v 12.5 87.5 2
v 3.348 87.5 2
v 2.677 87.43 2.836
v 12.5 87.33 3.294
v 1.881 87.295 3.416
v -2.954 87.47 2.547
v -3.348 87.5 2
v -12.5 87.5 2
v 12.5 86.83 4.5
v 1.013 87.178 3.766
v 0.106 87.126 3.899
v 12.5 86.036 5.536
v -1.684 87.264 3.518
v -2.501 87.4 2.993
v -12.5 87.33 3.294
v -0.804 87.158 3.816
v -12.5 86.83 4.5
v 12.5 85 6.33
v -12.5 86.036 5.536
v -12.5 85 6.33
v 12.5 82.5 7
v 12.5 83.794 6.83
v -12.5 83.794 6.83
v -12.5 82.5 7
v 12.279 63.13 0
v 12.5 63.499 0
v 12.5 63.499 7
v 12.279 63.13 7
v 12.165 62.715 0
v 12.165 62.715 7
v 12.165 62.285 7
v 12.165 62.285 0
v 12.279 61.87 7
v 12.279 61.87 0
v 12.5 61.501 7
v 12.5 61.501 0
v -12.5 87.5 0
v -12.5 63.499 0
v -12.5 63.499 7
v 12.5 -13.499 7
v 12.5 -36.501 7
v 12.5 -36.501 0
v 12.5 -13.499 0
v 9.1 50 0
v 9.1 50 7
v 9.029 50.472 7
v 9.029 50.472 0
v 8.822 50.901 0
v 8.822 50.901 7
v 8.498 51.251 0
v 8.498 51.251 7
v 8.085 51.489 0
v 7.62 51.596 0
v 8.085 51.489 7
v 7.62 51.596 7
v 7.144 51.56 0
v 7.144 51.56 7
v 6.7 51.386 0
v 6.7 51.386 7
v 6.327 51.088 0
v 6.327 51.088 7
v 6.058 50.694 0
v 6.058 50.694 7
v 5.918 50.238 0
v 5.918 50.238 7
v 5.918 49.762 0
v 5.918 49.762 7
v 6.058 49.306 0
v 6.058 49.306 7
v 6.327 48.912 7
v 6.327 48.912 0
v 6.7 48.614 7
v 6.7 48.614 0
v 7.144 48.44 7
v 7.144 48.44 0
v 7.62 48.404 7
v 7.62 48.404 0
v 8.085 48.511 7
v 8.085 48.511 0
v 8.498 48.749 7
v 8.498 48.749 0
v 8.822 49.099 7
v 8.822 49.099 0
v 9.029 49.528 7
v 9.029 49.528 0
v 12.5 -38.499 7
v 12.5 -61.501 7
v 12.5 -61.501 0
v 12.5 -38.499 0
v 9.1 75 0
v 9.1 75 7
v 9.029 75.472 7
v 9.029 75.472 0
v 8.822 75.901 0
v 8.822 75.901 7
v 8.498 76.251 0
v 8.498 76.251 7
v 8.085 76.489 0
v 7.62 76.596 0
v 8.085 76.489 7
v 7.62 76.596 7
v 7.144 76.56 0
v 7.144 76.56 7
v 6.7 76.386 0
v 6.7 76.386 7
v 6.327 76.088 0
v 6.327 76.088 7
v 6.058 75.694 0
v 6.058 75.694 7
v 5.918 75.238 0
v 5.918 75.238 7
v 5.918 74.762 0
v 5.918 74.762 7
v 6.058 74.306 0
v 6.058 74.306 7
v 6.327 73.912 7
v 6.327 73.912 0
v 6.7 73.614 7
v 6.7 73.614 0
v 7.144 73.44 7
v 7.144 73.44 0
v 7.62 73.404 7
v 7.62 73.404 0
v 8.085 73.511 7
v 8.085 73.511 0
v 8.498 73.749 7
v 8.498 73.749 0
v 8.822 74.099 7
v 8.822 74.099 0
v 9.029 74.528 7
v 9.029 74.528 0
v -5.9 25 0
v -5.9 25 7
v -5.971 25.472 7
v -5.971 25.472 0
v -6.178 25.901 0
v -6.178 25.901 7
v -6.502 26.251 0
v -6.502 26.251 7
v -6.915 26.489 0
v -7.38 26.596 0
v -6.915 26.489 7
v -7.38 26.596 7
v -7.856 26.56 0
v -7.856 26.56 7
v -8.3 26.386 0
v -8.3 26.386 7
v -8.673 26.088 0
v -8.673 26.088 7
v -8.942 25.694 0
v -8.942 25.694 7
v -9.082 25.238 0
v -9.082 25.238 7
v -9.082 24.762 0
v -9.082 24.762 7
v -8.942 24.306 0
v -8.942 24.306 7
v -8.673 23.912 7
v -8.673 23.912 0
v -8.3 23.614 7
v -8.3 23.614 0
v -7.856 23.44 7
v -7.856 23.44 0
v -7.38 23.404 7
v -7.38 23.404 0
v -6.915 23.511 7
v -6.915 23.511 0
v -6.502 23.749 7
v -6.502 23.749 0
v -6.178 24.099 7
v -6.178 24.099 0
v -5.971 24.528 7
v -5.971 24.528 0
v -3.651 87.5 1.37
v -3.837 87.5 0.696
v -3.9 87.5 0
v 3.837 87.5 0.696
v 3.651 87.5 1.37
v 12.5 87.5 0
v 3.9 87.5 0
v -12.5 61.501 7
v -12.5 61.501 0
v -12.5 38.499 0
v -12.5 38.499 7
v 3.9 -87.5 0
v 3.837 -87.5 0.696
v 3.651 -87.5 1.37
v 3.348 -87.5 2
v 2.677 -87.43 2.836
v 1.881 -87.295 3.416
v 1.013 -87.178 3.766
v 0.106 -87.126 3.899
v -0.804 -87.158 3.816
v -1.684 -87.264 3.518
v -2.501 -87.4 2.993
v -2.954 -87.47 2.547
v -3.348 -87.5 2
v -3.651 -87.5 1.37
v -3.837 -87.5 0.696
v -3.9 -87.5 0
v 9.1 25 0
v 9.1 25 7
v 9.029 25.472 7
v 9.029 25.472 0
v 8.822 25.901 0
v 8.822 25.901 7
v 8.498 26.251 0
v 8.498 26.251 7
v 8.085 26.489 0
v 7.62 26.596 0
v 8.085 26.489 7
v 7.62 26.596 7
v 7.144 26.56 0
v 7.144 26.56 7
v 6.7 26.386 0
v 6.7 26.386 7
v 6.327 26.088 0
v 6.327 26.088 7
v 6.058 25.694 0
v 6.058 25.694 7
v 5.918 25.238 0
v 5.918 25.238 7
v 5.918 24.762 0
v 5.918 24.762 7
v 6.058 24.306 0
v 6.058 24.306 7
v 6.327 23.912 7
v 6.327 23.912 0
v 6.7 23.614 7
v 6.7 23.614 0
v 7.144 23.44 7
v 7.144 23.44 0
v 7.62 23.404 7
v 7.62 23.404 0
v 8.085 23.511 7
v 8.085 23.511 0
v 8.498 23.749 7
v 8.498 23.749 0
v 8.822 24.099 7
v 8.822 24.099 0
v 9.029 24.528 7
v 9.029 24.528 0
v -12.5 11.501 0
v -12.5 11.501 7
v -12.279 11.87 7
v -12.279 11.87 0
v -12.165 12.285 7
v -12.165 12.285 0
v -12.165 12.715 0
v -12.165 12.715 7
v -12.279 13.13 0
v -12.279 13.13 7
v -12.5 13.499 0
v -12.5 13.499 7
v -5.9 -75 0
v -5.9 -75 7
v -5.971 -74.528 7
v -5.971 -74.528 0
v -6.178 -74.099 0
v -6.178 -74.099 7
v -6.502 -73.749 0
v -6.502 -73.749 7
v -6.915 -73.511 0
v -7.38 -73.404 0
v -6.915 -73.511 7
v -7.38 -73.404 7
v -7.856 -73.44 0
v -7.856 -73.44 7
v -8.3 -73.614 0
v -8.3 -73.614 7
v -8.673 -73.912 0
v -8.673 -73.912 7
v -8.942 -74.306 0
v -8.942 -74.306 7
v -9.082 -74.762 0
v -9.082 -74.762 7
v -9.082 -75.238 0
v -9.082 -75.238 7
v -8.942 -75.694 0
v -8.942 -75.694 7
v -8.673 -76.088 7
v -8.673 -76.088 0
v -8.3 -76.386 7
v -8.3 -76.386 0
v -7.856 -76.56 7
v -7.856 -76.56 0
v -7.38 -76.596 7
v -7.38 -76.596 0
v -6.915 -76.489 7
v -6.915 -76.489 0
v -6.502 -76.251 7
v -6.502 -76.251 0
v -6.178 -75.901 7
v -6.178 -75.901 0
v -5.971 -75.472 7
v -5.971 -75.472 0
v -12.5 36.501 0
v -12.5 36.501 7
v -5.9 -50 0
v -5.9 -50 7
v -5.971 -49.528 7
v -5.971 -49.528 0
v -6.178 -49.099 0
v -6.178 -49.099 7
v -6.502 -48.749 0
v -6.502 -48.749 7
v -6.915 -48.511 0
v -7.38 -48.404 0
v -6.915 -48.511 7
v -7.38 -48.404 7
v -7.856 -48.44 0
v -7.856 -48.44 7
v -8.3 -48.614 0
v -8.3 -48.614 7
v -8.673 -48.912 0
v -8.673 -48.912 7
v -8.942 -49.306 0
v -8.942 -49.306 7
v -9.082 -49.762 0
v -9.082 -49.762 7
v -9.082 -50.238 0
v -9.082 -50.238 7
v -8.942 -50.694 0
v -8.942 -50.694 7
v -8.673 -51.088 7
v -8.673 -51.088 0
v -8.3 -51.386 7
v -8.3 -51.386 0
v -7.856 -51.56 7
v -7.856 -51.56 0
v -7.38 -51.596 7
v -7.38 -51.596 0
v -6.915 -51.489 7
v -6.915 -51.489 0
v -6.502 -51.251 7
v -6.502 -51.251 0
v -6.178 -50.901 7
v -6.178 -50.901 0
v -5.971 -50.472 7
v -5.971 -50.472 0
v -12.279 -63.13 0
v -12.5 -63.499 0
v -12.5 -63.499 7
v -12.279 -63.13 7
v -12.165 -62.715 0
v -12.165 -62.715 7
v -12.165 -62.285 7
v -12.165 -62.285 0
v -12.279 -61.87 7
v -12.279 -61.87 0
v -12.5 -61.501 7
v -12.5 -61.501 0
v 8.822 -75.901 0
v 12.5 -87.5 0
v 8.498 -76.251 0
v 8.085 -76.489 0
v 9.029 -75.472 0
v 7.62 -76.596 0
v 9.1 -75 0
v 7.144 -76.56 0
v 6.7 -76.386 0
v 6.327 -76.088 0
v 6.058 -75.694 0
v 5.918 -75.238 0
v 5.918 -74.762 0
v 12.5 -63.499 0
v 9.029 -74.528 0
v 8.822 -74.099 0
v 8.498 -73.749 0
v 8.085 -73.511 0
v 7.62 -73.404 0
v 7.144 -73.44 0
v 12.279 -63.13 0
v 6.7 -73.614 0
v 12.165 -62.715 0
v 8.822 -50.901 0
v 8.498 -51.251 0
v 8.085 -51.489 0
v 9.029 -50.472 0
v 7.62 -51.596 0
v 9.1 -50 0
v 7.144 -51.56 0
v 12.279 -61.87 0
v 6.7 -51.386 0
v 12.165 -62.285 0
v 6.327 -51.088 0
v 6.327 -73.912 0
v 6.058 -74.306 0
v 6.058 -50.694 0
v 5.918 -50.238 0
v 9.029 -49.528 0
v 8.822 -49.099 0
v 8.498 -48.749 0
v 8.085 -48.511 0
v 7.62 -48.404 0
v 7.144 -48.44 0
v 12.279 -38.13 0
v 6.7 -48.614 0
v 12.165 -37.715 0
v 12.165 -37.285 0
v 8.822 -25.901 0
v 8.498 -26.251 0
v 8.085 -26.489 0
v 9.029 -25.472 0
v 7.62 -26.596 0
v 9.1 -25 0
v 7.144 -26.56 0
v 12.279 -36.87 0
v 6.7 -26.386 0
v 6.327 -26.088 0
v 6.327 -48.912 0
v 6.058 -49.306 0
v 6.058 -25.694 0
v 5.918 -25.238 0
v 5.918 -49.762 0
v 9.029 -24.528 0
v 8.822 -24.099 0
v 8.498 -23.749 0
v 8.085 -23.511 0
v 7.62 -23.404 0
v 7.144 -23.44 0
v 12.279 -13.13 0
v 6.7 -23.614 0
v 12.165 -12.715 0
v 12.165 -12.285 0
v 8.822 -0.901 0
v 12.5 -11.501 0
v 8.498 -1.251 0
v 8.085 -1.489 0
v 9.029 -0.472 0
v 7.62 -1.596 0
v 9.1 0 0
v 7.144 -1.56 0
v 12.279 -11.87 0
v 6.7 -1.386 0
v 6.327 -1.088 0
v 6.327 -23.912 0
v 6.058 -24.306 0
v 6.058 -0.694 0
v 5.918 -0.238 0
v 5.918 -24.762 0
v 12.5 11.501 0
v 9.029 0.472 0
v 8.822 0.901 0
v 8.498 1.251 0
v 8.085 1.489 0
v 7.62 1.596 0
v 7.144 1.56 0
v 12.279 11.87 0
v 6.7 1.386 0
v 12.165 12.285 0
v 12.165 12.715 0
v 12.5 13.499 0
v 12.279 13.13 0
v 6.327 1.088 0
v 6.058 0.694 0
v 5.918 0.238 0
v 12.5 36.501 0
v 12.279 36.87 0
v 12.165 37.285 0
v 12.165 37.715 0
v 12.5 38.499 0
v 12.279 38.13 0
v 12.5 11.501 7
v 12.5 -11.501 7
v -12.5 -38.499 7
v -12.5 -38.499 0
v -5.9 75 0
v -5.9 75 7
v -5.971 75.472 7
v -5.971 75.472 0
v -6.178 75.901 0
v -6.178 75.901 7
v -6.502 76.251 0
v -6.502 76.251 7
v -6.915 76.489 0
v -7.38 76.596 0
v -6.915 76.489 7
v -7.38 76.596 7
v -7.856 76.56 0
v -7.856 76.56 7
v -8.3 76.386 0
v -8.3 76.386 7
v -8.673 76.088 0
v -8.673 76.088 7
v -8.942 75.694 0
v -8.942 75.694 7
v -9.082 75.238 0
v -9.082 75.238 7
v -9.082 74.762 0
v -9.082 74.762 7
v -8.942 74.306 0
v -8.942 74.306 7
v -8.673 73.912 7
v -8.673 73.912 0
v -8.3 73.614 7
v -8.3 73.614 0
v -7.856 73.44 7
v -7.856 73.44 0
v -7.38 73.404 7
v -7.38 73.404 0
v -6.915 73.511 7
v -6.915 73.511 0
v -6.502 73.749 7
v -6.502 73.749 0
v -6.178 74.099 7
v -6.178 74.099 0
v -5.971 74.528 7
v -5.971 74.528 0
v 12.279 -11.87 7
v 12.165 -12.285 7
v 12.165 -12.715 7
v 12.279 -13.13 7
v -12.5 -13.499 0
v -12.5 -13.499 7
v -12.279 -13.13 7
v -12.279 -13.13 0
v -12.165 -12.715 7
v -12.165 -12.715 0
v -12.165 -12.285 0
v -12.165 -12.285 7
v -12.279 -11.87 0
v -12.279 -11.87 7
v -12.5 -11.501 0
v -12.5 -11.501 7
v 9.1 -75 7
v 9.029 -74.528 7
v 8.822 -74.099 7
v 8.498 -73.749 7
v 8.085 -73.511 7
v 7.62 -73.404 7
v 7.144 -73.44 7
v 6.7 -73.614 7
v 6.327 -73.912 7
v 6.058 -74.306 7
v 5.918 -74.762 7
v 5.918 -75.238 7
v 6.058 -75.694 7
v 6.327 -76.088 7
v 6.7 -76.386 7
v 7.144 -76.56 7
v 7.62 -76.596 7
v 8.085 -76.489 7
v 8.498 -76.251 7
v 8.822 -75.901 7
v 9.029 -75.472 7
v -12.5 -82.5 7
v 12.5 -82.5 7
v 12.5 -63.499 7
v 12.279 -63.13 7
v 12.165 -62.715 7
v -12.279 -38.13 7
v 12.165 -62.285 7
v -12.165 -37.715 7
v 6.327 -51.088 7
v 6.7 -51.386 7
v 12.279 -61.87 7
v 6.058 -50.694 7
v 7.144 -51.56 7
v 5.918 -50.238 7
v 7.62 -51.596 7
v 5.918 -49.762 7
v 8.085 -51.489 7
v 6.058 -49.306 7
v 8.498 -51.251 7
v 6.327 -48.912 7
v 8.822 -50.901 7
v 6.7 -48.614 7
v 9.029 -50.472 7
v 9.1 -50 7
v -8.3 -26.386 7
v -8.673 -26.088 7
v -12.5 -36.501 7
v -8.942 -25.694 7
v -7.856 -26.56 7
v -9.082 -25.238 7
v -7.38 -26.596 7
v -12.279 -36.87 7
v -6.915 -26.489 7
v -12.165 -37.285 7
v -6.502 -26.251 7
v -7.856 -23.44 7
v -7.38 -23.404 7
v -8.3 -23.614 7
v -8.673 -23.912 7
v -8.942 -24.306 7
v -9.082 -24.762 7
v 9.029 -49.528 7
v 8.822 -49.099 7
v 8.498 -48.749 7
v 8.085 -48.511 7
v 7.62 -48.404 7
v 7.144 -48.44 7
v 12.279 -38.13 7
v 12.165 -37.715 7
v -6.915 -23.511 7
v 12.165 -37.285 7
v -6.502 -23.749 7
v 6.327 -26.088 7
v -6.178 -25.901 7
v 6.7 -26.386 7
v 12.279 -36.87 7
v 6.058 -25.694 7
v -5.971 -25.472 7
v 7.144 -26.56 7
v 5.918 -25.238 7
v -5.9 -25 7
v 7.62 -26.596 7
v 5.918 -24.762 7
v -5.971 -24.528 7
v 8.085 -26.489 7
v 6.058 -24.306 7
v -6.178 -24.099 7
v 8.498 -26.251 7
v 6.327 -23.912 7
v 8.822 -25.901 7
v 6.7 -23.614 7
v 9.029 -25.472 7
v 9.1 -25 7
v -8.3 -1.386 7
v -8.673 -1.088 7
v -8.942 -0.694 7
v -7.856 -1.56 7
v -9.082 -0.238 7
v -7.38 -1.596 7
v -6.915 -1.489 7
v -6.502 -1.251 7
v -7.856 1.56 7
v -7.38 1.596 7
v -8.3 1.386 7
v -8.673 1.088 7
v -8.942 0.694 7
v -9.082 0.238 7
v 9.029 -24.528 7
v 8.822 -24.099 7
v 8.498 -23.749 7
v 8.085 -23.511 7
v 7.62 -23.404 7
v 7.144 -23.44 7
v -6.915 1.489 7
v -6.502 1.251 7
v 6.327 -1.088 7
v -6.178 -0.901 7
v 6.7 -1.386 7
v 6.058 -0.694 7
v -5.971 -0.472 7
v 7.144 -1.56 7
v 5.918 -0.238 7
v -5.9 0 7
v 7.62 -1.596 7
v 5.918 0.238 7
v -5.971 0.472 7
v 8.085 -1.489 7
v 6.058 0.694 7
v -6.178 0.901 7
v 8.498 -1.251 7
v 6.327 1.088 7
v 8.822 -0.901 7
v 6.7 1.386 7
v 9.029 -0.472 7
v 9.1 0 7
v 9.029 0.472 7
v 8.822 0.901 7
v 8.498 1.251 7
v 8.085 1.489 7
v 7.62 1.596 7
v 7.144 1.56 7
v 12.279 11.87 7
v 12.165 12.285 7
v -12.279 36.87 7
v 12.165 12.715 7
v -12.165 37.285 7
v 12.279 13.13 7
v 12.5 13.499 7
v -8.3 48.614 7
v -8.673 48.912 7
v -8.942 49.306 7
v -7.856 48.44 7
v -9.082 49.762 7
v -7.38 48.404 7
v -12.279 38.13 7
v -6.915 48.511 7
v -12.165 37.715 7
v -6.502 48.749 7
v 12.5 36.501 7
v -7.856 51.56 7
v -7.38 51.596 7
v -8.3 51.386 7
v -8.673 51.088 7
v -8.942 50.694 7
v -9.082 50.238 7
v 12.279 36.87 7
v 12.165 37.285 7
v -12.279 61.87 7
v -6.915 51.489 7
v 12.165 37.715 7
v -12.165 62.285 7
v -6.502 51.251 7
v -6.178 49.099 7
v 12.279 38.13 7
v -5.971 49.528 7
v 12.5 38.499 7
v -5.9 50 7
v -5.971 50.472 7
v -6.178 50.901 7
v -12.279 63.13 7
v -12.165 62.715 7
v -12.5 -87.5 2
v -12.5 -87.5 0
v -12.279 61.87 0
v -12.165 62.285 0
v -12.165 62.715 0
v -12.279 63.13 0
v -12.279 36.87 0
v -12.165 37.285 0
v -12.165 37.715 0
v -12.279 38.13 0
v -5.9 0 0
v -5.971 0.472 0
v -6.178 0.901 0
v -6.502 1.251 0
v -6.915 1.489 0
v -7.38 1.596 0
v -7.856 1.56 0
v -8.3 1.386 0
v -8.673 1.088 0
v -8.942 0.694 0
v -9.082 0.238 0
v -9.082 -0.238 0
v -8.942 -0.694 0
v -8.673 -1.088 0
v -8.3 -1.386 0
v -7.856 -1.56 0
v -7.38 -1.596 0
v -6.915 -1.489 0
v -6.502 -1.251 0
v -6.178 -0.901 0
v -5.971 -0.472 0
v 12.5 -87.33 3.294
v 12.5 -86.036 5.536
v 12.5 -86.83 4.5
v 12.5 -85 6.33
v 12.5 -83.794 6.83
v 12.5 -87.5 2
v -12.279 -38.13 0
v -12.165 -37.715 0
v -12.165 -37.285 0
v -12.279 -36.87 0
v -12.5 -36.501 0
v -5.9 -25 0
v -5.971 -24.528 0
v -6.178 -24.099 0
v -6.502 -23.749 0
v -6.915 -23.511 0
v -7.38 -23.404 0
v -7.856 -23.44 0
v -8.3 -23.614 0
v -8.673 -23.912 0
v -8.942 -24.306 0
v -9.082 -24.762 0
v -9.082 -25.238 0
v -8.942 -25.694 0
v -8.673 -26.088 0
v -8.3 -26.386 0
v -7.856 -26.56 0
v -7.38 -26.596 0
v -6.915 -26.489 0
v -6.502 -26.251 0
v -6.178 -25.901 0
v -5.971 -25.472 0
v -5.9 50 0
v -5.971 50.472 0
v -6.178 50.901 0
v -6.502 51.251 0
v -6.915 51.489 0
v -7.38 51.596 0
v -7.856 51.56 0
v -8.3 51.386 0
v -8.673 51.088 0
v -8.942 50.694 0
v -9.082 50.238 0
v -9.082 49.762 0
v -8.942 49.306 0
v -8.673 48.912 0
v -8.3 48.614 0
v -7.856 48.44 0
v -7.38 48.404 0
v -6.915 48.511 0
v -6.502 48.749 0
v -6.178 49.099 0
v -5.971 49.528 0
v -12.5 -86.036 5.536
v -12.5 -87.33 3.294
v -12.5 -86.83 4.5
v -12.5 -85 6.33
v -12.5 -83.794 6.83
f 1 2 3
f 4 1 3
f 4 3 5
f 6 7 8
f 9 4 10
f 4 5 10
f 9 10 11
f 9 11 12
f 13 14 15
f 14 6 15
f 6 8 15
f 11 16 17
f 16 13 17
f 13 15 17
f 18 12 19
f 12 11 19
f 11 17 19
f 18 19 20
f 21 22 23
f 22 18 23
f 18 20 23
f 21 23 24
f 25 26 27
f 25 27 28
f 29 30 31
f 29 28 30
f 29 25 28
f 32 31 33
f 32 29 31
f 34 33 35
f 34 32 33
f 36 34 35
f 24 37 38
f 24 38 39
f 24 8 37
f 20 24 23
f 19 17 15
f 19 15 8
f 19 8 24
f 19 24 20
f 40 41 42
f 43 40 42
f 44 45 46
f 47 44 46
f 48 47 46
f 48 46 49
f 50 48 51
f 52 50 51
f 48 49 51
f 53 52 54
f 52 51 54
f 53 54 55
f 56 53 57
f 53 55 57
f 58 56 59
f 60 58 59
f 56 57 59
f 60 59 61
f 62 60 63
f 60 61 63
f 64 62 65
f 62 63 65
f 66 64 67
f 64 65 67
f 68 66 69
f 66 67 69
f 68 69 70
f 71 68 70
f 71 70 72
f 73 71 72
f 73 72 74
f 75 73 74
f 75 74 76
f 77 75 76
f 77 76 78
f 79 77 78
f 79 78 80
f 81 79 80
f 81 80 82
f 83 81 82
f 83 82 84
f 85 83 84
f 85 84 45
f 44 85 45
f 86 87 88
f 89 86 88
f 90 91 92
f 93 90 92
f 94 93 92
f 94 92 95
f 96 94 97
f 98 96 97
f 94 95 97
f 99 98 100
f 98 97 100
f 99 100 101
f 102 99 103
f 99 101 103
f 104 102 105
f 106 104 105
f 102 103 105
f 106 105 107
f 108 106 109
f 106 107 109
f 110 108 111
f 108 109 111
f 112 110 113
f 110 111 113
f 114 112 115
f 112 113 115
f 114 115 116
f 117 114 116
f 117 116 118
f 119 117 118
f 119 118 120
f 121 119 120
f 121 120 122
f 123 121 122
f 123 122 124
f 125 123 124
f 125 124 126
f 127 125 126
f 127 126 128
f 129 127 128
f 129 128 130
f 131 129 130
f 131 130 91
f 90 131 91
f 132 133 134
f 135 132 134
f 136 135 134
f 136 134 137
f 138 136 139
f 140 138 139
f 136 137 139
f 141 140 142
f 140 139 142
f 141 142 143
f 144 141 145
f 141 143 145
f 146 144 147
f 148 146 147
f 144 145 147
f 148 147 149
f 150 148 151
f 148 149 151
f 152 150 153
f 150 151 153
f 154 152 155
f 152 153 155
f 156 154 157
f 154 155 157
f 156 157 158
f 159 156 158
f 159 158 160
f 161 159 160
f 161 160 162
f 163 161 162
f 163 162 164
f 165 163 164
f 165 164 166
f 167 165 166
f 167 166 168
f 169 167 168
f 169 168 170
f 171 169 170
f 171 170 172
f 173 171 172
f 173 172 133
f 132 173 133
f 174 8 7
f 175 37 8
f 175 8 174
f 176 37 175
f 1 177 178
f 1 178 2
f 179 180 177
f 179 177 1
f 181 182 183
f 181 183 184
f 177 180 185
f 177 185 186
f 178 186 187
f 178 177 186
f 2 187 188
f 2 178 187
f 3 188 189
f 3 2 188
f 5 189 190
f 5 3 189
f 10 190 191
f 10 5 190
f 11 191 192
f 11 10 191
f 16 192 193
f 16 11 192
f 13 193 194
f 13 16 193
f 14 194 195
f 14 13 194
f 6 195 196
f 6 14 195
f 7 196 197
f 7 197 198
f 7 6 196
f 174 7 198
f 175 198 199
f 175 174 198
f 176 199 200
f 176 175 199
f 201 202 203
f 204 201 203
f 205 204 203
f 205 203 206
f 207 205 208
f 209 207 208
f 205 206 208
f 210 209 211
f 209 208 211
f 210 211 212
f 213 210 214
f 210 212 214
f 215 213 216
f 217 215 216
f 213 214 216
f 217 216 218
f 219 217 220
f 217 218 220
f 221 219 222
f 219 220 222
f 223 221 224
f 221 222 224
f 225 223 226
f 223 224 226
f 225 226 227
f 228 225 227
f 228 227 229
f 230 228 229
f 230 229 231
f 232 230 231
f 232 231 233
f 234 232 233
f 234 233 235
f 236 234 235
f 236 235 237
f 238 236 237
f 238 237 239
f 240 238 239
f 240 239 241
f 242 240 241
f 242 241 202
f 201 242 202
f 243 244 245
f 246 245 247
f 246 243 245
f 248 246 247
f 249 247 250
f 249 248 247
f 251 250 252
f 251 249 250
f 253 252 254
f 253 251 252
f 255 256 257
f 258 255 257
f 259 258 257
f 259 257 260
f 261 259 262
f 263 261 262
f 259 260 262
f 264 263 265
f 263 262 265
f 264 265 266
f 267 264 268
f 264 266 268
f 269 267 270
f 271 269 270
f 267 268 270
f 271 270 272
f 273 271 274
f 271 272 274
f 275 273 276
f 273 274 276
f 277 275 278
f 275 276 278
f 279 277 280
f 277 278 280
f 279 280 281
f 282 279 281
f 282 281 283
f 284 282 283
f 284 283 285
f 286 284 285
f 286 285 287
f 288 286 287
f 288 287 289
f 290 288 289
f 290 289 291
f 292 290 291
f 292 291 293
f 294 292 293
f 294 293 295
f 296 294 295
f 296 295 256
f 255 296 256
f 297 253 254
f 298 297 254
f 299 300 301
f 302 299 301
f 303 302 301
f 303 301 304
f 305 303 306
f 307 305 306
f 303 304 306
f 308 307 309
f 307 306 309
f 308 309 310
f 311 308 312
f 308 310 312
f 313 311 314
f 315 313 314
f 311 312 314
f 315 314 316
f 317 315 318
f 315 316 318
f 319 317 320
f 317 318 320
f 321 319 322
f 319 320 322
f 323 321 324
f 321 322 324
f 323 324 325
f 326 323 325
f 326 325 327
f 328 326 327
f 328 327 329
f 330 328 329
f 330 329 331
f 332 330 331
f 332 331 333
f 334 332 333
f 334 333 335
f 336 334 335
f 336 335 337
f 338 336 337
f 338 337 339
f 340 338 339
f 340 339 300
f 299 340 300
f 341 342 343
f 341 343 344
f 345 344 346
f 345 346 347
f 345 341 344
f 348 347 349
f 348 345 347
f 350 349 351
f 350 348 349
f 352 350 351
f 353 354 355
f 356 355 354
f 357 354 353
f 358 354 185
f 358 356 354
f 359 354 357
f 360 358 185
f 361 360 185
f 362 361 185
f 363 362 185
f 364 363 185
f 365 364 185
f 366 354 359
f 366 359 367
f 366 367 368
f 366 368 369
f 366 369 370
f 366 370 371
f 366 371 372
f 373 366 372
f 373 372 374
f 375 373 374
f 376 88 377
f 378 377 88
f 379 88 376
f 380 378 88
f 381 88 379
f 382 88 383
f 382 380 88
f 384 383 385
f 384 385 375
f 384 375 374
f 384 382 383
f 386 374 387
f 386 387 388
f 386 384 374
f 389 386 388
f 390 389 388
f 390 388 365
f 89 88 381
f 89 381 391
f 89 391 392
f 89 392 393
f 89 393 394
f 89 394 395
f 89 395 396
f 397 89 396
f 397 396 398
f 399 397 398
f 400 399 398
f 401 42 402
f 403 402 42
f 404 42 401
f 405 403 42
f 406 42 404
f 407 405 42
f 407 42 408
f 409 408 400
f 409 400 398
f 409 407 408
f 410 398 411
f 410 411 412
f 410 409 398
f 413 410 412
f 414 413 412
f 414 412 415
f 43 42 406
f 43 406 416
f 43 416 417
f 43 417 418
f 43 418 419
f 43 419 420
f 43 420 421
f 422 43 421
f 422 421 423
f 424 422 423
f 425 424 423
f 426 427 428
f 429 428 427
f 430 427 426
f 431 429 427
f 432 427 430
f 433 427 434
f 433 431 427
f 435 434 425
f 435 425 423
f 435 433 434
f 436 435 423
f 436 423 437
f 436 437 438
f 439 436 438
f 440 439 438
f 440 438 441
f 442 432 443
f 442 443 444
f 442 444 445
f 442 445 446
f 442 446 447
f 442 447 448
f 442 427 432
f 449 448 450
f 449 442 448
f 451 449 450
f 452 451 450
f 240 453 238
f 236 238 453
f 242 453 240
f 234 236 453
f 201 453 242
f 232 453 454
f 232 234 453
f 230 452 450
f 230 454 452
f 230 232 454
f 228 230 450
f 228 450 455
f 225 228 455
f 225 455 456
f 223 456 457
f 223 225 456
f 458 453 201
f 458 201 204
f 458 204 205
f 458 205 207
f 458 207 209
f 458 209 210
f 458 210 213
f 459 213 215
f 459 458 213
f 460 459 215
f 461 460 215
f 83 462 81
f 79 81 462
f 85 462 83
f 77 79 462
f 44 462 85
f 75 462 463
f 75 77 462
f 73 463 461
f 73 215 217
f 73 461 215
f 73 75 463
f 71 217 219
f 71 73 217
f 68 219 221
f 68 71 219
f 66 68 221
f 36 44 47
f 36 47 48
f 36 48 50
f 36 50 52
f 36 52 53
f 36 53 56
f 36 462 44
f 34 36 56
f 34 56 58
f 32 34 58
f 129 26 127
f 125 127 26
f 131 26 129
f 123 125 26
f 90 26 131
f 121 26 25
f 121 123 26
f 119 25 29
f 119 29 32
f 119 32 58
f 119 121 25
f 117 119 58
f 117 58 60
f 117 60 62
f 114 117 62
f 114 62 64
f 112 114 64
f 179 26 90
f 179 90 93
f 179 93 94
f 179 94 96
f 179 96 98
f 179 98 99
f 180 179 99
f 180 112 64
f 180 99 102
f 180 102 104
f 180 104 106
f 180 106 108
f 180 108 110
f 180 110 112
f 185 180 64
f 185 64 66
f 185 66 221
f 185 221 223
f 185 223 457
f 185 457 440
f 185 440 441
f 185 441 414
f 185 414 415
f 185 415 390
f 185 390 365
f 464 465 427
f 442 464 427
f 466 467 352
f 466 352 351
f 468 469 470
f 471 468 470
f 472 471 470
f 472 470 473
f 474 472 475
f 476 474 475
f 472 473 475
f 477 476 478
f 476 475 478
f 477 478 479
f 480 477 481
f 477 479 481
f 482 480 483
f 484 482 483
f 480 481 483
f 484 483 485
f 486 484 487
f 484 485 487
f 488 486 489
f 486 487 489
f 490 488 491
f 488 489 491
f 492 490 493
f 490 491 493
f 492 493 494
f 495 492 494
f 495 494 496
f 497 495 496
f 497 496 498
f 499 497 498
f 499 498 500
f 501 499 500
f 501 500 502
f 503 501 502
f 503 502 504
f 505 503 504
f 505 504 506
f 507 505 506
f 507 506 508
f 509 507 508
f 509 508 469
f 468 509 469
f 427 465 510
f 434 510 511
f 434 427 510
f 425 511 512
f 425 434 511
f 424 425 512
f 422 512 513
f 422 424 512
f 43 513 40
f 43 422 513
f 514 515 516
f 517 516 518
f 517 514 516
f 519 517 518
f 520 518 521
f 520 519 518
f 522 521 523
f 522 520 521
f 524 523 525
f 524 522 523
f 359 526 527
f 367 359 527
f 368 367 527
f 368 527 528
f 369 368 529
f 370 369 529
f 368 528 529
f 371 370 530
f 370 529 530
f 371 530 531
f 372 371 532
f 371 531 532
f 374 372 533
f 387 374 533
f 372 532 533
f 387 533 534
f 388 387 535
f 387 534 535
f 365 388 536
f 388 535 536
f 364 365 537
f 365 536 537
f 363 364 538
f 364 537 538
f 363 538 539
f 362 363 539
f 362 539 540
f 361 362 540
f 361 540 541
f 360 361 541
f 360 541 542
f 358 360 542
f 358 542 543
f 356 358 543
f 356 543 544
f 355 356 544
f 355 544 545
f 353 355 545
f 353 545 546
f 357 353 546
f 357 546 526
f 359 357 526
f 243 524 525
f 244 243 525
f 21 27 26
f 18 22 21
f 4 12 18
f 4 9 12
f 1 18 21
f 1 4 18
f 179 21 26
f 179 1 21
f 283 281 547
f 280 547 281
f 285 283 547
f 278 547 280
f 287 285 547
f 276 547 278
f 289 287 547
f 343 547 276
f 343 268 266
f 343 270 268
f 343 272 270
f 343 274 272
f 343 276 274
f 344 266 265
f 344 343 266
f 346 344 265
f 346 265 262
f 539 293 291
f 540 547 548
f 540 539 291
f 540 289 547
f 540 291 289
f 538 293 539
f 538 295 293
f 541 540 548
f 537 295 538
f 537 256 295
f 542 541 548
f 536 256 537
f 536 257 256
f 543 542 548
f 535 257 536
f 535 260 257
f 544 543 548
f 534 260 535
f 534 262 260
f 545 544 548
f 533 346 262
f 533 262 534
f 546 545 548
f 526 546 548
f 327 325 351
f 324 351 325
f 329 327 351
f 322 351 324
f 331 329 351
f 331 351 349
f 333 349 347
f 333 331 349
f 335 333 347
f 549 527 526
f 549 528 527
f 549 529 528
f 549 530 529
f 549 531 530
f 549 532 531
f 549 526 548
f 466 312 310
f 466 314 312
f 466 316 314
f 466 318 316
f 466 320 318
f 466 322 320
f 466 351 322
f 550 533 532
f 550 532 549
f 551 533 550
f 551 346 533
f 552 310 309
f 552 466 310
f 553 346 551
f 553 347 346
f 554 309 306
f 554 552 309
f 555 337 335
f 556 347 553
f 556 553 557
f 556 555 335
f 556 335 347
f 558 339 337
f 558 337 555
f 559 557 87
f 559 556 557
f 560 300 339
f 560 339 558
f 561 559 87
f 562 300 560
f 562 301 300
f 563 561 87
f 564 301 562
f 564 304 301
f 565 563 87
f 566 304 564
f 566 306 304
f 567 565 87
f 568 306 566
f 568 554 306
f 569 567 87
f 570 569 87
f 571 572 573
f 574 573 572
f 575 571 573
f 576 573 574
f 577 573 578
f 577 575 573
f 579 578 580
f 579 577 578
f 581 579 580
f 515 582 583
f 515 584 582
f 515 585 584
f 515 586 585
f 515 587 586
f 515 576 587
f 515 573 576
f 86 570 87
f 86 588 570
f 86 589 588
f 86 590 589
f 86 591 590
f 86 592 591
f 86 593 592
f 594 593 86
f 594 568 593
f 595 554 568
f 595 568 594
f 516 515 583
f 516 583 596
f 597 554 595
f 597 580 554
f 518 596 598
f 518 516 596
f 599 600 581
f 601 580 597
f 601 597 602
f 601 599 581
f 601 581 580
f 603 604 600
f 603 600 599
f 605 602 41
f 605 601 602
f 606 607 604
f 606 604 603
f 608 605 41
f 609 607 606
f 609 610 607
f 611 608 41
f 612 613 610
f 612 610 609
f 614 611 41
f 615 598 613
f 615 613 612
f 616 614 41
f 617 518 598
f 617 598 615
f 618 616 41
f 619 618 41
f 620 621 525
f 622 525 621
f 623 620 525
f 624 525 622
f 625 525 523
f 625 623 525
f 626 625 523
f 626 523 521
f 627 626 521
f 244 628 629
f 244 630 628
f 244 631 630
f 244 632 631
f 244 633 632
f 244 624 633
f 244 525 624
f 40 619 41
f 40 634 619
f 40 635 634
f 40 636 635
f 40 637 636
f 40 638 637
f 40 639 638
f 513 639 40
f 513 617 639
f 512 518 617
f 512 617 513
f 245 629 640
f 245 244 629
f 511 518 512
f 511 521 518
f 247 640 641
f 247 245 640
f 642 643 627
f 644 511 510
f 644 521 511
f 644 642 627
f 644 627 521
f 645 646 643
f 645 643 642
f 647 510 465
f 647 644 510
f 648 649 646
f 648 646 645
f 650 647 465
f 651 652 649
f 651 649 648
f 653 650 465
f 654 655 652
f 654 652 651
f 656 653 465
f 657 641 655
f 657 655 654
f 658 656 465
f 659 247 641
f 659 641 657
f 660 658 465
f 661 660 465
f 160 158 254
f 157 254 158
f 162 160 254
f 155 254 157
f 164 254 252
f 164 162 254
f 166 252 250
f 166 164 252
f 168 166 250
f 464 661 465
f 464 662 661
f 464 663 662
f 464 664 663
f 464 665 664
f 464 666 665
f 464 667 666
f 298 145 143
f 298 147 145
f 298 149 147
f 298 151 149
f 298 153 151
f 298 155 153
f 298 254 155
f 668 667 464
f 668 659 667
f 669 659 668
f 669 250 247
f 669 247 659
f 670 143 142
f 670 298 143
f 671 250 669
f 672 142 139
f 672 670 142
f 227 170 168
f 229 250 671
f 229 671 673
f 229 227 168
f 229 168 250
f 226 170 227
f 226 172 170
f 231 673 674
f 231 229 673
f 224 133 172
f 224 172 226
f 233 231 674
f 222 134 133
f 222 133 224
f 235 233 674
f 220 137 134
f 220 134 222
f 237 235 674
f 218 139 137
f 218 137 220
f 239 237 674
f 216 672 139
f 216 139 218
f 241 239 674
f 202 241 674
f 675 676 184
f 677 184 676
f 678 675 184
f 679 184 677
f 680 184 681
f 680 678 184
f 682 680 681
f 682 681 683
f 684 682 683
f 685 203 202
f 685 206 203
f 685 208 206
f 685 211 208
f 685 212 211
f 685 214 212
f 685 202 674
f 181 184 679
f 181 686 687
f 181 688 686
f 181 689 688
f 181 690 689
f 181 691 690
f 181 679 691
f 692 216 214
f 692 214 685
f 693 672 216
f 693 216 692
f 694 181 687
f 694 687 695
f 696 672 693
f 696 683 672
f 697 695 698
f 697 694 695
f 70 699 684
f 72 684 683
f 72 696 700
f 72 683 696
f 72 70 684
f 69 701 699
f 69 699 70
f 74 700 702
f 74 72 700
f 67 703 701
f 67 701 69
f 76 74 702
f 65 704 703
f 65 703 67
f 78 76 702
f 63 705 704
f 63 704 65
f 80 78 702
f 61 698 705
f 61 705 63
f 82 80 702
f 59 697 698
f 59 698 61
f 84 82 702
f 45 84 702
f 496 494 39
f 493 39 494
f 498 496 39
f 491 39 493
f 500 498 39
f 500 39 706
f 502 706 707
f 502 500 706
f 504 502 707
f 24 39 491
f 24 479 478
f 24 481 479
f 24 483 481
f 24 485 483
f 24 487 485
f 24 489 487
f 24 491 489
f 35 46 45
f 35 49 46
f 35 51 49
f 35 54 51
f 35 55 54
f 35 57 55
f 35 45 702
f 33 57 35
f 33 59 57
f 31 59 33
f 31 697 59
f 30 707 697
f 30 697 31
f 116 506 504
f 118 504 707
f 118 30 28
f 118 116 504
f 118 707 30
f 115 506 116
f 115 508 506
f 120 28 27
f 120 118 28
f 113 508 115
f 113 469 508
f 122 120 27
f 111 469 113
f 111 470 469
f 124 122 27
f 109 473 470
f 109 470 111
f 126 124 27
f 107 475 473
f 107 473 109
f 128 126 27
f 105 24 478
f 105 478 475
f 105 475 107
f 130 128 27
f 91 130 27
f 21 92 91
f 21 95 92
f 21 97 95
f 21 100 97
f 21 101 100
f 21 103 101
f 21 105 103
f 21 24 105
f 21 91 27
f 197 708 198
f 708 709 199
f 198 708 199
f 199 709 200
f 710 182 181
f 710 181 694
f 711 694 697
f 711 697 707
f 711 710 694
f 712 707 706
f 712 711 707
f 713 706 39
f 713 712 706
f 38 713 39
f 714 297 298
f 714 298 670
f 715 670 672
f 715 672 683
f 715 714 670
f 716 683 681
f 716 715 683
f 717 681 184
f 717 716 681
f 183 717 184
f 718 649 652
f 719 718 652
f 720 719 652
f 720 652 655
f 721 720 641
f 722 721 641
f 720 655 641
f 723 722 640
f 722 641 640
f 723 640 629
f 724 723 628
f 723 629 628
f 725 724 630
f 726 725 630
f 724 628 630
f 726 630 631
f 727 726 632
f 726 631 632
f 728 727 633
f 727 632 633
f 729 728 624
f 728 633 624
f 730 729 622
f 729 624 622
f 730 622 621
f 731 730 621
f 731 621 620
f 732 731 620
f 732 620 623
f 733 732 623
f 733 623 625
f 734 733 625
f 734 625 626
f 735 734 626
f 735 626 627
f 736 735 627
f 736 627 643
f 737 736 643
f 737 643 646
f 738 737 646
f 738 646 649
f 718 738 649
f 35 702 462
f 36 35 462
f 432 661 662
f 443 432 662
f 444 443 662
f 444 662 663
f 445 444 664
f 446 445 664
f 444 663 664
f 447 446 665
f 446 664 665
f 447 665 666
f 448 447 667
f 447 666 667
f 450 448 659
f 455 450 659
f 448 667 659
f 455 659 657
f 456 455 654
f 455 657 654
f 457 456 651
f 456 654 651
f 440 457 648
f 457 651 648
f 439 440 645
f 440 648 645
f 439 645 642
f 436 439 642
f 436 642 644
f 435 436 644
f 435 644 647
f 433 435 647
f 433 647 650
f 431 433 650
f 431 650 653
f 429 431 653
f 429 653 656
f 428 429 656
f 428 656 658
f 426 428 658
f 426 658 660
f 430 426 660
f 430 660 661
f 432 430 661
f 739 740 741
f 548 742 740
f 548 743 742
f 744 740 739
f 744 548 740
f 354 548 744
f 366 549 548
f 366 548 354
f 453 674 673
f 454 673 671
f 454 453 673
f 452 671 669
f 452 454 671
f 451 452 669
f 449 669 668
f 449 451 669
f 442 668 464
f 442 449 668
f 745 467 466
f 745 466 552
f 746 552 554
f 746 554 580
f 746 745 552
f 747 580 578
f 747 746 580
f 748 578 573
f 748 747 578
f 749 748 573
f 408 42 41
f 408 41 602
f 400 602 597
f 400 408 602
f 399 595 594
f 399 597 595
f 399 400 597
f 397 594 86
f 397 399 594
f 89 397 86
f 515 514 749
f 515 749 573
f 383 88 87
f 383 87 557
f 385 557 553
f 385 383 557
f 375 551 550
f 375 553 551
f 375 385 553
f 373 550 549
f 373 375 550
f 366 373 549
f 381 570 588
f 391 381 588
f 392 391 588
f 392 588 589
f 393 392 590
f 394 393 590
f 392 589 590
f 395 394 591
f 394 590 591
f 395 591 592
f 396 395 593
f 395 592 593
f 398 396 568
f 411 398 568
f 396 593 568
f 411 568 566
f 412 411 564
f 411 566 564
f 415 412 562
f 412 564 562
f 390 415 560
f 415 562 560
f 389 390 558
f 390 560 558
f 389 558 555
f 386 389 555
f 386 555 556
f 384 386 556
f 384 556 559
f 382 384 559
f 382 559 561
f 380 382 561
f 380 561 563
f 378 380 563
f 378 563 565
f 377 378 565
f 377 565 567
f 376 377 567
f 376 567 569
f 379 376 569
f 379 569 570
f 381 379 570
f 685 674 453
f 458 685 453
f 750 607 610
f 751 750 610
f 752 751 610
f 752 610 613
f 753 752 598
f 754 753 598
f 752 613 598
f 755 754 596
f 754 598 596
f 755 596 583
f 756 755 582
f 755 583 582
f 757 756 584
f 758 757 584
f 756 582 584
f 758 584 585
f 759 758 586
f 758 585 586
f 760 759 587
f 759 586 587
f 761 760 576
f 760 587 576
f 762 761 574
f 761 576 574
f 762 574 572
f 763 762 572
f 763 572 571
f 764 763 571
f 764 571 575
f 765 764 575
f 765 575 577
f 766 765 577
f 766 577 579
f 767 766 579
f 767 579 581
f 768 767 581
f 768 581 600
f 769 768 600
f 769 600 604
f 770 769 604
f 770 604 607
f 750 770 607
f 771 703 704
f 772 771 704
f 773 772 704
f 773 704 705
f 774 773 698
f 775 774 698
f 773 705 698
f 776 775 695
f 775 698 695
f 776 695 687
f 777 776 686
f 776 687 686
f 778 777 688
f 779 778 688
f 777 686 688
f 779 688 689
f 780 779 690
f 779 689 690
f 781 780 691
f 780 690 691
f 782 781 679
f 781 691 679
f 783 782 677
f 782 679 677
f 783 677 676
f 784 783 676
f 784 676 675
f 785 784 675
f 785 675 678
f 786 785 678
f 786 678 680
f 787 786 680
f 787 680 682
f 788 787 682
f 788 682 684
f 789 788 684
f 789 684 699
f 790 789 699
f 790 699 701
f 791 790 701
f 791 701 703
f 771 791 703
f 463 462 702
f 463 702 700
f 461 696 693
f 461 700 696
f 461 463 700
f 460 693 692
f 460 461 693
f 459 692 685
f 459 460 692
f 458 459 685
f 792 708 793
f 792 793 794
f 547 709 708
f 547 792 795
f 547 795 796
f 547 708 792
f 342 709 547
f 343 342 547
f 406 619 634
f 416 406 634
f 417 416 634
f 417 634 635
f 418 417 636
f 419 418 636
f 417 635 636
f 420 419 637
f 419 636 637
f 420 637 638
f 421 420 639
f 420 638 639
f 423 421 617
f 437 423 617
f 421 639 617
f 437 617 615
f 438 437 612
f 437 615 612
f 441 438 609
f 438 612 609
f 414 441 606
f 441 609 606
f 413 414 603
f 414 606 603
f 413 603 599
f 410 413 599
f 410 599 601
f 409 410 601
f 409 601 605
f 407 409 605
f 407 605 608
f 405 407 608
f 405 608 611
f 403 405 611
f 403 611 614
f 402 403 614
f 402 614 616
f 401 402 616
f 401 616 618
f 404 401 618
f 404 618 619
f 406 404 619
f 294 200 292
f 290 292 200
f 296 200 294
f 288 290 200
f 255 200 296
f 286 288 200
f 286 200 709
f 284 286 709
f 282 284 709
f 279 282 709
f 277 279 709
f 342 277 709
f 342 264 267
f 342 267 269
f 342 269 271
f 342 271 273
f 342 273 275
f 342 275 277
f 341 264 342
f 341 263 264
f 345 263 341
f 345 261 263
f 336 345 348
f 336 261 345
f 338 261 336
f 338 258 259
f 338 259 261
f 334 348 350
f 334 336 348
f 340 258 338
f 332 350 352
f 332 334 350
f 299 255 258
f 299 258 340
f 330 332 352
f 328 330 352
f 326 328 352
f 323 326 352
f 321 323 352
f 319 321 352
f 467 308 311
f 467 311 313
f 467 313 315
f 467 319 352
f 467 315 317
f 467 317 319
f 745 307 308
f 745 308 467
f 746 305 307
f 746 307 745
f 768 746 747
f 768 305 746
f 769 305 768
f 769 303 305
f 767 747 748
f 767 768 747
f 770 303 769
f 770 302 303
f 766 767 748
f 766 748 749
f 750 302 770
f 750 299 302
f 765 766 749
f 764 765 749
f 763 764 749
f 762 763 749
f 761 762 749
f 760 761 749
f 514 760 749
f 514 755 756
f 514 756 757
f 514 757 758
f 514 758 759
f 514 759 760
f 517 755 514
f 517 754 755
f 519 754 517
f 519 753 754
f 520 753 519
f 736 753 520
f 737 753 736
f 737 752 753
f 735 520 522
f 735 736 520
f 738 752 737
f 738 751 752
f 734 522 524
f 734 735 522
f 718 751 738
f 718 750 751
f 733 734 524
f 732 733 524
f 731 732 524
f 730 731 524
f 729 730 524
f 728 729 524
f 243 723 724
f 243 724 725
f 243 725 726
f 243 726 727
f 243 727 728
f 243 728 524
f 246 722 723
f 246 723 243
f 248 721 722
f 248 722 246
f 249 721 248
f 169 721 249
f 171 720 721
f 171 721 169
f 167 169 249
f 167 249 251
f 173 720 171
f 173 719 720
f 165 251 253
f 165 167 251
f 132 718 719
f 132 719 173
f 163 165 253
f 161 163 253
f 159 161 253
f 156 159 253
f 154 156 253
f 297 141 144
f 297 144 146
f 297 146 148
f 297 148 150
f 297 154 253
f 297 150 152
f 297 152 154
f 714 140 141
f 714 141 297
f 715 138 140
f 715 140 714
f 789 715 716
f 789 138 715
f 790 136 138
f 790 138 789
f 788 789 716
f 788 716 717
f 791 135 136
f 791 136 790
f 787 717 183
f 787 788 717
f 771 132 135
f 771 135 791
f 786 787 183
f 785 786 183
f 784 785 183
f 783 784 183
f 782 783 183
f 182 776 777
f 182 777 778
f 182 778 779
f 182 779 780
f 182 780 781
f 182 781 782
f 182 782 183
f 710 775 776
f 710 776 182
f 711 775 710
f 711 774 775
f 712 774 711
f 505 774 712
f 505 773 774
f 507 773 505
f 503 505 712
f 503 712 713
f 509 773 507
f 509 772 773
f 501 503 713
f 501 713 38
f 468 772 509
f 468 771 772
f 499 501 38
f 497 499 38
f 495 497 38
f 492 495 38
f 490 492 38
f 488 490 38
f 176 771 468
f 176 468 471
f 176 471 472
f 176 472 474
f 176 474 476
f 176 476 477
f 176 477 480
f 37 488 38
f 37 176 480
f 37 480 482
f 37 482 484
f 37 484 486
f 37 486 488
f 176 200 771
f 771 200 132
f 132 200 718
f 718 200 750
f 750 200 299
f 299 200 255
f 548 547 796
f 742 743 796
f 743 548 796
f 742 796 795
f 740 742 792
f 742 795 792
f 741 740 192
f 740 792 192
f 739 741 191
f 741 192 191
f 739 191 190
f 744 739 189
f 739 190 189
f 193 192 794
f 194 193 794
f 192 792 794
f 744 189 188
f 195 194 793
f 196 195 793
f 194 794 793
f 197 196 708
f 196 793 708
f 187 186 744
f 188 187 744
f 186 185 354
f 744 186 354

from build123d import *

# Parameters (mm, degrees)
EXTRUDE_1_DEPTH             = 87.5
SKETCH_4_R                  = 1.6
CUT_EXTRUDE_3_DEPTH         = 89.665100237
PATTERN_LINEAR_2_COUNT      = 6
PATTERN_LINEAR_2_PITCH      = 25
FILLET_1_R                  = 5
SKETCH_5_R                  = 1.6
CUT_EXTRUDE_4_DEPTH         = 89.665100357
PATTERN_LINEAR_3_COUNT      = 2
PATTERN_LINEAR_3_PITCH      = 15
PATTERN_LINEAR_3_COUNT_DIR2 = 7
PATTERN_LINEAR_3_PITCH_DIR2 = 25


with BuildPart() as part:
    # 草图2 → 凸台-拉伸1 (new, symmetric)
    with BuildSketch(Plane(origin=(0, 0, 0), x_dir=(1, 0, 0), z_dir=(0, 1, 0))):
        with BuildLine():
            Line((-3.9, 0), (-12.5, 0))
            Line((-12.5, 0), (-12.5, -7))
            Line((-12.5, -7), (12.5, -7))
            Line((12.5, -7), (12.5, 0))
            Line((12.5, 0), (3.9, 0))
            ThreePointArc((3.9, 0), (0, -3.9), (-3.9, 0))
        make_face()
    extrude(amount=EXTRUDE_1_DEPTH, both=True)

    # 草图4 → 切除-拉伸3 (cut, through all)
    with BuildSketch(Plane.XY):
        with Locations((-13.75, 62.5)):
            Circle(SKETCH_4_R)
        with Locations((13.75, 62.5)):
            Circle(SKETCH_4_R)
    cut_extrude_3 = extrude(amount=CUT_EXTRUDE_3_DEPTH, mode=Mode.SUBTRACT)

    # 阵列(线性)2: 切除-拉伸3 ×6
    with Locations(*[(0, -i * PATTERN_LINEAR_2_PITCH, 0) for i in range(1, PATTERN_LINEAR_2_COUNT)]):
        add(cut_extrude_3, mode=Mode.SUBTRACT)

    # 圆角1
    # the kernel refuses this fillet: 5 mm, written as the material it takes off along each edge
    with BuildSketch(Plane(origin=(-25, 87.5, 7), x_dir=(0, -1, 0), z_dir=(1, 0, 0))) as fillet_1_piece_1:
        with BuildLine():
            CenterArc((FILLET_1_R, FILLET_1_R), FILLET_1_R, 180, 90)
            Line((0, FILLET_1_R), (0, 0))
            Line((0, 0), (FILLET_1_R, 0))
        make_face()
    extrude(amount=50, mode=Mode.SUBTRACT)
    with BuildSketch(Plane(origin=(-25, -87.5, 7), x_dir=(0, 1, 0), z_dir=(1, 0, 0))) as fillet_1_piece_2:
        with BuildLine():
            CenterArc((FILLET_1_R, -FILLET_1_R), FILLET_1_R, 90, 90)
            Line((0, -FILLET_1_R), (0, 0))
            Line((0, 0), (FILLET_1_R, 0))
        make_face()
    extrude(amount=50, mode=Mode.SUBTRACT)

    # 草图5 → 切除-拉伸4 (cut, through all)
    with BuildSketch(Plane.XY.offset(7)):
        with Locations((-7.5, 75)):
            Circle(SKETCH_5_R)
    cut_extrude_4 = extrude(amount=-CUT_EXTRUDE_4_DEPTH, mode=Mode.SUBTRACT)

    # 阵列(线性)3: Cut-Extrude 4 2 × 7
    with Locations(*[(i * PATTERN_LINEAR_3_PITCH, -j * PATTERN_LINEAR_3_PITCH_DIR2, 0) for i in range(PATTERN_LINEAR_3_COUNT) for j in range(PATTERN_LINEAR_3_COUNT_DIR2) if (i, j) != (0, 0)]):
        add(cut_extrude_4, mode=Mode.SUBTRACT)


solid = part.part
